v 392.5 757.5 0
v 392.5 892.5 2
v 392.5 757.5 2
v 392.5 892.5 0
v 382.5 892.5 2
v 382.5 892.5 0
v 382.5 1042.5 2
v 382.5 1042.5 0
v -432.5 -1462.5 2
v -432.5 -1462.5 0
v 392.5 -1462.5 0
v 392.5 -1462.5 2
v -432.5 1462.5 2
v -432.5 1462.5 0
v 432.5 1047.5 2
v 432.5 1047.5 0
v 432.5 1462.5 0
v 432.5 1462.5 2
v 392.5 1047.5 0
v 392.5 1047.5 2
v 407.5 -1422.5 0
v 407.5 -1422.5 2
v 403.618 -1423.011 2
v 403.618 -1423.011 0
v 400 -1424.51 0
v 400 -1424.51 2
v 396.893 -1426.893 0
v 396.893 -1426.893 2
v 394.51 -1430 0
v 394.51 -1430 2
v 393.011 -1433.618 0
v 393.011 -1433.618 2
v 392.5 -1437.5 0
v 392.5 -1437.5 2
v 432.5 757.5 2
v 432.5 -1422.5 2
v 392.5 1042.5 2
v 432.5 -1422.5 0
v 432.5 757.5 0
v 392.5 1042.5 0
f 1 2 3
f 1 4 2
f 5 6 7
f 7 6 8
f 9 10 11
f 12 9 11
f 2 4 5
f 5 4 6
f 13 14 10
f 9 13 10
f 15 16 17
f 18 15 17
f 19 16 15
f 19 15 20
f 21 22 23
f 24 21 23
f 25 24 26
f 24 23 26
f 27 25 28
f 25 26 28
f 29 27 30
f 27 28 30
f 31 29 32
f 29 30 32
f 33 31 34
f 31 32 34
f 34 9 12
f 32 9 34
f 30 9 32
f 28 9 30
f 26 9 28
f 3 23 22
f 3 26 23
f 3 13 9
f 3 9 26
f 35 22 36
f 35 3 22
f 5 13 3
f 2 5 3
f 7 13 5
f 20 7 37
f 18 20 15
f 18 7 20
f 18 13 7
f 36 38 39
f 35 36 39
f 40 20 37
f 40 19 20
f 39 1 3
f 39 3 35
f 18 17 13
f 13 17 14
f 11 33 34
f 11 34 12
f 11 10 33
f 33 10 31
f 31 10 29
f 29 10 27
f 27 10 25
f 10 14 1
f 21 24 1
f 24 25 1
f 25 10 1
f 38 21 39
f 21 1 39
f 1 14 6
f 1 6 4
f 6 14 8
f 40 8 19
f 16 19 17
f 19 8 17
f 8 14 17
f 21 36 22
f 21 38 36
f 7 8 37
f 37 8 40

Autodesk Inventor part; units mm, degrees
ref_plane "YZ Plane" through (0, 0, 0) normal (1, 0, 0) x (0, 1, 0)
ref_plane "XZ Plane" through (0, 0, 0) normal (0, 1, 0) x (-1, 0, 0)
ref_plane "XY Plane" through (0, 0, 0) normal (0, 0, 1) x (1, 0, 0)
sketch "Sketch1" plane through (0, 0, 0) normal (0, 0, 1) x (1, 0, 0)
  line L0 (-432.5, -1462.5) -> (432.5, -1462.5)
  line L1 (432.5, -1462.5) -> (432.5, 1462.5)
  line L2 (432.5, 1462.5) -> (-432.5, 1462.5)
  line L3 (-432.5, 1462.5) -> (-432.5, -1462.5)
  line L4 (-432.5, -1462.5) -> (432.5, 1462.5) construction
  line L5 (432.5, -1462.5) -> (-432.5, 1462.5) construction
  line L6 (432.5, -1422.5) -> (392.5, -1422.5)
  line L7 (392.5, -1422.5) -> (392.5, -1462.5)
  line L8 (432.5, 1047.5) -> (392.5, 1047.5)
  line L9 (392.5, 1047.5) -> (392.5, 757.5)
  line L10 (392.5, 757.5) -> (432.5, 757.5)
  line L11 (432.5, 757.5) -> (432.5, 1047.5)
  line L12 (392.5, 892.5) -> (382.5, 892.5)
  line L13 (382.5, 892.5) -> (382.5, 1042.5)
  line L14 (382.5, 1042.5) -> (392.5, 1042.5)
  point P0 (0, 0)
  point P1 (432.5, 757.5)
  dimension "d154" = 865
  dimension "d155" = 2925
  dimension "d157" = 40
  dimension "d159" = 290
  dimension "d161" = 40
  dimension "d162" = 2220
  dimension "d163" = 10
  dimension "d164" = 150
  dimension "d165" = 5
extrude "Plate5" add sketch "Sketch1" along normal blind 2 contours L3 L2 L1 L8 L9 L14 L13 L12 L10 L6 L7 L0
fillet "Corner Round1" radius 15 1 edges at (392.5, -1422.5, 1)
properties part number "PNS-0114 floor sheet 41" material "Stainless Steel"
